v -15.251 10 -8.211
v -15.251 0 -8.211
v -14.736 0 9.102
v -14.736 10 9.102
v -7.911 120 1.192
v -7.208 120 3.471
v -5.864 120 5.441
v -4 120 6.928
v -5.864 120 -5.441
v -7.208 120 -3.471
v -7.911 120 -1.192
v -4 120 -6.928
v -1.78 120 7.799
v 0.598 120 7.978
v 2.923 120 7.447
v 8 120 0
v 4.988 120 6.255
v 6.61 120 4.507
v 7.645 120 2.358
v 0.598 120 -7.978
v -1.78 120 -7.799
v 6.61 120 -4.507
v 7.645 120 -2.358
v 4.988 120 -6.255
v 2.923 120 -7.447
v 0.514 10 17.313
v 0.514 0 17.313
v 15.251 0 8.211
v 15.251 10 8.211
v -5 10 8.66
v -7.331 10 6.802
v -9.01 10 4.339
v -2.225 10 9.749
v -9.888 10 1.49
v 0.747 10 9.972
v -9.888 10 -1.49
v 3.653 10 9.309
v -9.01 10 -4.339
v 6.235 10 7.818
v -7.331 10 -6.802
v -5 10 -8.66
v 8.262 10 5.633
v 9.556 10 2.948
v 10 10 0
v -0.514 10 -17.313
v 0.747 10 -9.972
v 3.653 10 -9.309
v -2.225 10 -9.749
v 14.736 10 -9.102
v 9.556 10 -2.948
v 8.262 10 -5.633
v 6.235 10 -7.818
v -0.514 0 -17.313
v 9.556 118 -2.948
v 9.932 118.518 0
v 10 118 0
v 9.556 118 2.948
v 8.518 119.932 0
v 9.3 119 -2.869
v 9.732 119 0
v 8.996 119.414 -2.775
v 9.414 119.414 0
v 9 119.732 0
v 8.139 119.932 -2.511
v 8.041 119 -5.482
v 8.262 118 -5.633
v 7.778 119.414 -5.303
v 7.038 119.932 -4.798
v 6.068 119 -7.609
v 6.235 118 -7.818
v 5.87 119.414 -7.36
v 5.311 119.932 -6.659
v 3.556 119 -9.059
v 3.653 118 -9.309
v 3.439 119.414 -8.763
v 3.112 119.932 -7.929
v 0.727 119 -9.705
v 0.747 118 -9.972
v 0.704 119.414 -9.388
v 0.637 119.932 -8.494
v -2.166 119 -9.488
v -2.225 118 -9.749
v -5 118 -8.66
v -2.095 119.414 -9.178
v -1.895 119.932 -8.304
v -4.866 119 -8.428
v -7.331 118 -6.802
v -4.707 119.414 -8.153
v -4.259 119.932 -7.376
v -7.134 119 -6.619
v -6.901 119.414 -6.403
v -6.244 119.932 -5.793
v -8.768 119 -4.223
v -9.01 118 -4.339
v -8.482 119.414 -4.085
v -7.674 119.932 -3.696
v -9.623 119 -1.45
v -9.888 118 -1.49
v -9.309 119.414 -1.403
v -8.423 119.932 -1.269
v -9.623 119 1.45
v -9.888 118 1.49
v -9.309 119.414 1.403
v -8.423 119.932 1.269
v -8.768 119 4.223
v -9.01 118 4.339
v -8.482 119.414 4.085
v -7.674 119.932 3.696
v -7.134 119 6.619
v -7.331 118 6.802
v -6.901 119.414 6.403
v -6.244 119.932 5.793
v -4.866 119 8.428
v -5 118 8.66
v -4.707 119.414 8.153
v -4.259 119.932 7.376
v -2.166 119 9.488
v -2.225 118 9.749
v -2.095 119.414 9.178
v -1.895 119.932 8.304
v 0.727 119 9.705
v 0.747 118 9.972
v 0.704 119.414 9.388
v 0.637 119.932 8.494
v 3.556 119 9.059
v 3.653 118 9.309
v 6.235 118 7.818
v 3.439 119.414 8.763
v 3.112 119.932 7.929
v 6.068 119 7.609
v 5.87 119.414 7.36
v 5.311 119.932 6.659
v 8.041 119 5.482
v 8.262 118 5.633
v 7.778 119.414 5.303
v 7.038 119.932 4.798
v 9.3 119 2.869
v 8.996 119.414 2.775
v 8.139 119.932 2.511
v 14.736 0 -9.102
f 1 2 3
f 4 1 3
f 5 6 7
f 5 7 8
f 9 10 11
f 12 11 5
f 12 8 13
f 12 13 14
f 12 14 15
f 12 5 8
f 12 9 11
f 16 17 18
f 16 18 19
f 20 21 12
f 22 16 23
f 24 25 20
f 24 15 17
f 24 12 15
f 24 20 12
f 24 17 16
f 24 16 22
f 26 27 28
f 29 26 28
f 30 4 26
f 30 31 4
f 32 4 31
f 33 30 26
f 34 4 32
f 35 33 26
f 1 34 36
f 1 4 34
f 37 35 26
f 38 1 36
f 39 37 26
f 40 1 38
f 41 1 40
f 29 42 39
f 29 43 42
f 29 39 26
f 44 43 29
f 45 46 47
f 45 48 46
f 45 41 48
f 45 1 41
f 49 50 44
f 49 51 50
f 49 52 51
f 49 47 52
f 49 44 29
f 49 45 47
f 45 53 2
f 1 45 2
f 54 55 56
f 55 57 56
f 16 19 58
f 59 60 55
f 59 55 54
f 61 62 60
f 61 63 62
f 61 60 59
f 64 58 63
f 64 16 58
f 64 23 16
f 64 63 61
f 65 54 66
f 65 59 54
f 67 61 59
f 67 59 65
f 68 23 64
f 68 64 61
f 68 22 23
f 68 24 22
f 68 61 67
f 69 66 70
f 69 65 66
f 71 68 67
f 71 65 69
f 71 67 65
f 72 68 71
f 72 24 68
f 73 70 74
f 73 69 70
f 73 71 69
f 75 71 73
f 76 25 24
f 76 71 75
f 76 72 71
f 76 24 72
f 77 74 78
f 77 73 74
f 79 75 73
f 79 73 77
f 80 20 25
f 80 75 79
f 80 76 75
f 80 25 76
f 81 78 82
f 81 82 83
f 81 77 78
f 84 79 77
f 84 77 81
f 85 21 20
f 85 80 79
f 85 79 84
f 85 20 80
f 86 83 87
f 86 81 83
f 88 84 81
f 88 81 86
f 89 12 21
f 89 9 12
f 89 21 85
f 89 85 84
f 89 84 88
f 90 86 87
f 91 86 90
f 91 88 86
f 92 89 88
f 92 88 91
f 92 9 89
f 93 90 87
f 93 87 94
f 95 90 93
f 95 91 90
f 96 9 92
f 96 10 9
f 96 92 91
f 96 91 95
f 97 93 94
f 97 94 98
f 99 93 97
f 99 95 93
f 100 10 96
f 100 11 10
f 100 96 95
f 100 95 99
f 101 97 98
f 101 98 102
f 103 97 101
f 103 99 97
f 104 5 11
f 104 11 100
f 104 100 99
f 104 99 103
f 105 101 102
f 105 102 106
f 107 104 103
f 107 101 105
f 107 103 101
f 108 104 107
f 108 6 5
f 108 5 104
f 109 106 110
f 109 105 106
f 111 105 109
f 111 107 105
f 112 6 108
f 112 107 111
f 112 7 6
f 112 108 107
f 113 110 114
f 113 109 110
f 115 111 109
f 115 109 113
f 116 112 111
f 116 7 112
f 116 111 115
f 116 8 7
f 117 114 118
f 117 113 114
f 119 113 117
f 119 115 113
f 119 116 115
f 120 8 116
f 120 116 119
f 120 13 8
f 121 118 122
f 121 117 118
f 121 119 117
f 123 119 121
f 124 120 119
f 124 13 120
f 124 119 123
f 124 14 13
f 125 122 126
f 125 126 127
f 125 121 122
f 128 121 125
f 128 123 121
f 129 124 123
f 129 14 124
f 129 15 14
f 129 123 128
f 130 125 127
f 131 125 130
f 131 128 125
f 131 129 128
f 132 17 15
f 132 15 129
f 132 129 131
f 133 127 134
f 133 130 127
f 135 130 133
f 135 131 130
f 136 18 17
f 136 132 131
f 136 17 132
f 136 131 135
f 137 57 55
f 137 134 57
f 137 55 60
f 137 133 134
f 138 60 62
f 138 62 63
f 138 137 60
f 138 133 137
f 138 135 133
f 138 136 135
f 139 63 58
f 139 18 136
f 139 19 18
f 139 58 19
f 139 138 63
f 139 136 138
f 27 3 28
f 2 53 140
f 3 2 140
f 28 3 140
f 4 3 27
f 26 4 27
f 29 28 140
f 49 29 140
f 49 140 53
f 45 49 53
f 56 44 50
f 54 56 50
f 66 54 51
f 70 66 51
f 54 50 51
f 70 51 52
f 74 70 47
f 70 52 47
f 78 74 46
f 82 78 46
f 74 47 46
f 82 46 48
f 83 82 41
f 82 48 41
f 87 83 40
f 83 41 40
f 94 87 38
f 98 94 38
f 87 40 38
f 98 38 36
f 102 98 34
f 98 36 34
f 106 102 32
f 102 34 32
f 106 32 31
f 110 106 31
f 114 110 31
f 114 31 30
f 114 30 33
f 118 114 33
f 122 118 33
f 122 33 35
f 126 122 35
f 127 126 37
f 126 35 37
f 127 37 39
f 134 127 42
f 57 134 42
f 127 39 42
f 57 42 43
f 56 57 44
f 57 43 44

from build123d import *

# Parameters (mm, degrees)
BOSS_EXTRU_1_DEPTH = 10
ESQUISSE2_R        = 10
BOSS_EXTRU_2_DEPTH = 110
CONG_1_R           = 2


with BuildPart() as part:
    # Esquisse1 → Boss.-Extru.1 (new body)
    with BuildSketch(Plane(origin=(0, 0, 0), x_dir=(1, 0, 0), z_dir=(0, 1, 0))):
        Polygon((14.736253584, 9.101803684), (-0.514266419, 17.312871803), (-15.250520003, 8.211068118), (-14.736253584, -9.101803684), (0.514266419, -17.312871803), (15.250520003, -8.211068118), align=None)
    extrude(amount=BOSS_EXTRU_1_DEPTH)

    # Esquisse2 → Boss.-Extru.2 (add)
    with BuildSketch(Plane(origin=(0, 10, 0), x_dir=(1, 0, 0), z_dir=(0, 1, 0))):
        Circle(ESQUISSE2_R)
    extrude(amount=BOSS_EXTRU_2_DEPTH)

    # Congé1
    cong_1_edges = [part.edges().sort_by_distance(p)[0] for p in [
        (-10, 120, 0),
    ]]
    fillet(cong_1_edges, radius=CONG_1_R)


solid = part.part
